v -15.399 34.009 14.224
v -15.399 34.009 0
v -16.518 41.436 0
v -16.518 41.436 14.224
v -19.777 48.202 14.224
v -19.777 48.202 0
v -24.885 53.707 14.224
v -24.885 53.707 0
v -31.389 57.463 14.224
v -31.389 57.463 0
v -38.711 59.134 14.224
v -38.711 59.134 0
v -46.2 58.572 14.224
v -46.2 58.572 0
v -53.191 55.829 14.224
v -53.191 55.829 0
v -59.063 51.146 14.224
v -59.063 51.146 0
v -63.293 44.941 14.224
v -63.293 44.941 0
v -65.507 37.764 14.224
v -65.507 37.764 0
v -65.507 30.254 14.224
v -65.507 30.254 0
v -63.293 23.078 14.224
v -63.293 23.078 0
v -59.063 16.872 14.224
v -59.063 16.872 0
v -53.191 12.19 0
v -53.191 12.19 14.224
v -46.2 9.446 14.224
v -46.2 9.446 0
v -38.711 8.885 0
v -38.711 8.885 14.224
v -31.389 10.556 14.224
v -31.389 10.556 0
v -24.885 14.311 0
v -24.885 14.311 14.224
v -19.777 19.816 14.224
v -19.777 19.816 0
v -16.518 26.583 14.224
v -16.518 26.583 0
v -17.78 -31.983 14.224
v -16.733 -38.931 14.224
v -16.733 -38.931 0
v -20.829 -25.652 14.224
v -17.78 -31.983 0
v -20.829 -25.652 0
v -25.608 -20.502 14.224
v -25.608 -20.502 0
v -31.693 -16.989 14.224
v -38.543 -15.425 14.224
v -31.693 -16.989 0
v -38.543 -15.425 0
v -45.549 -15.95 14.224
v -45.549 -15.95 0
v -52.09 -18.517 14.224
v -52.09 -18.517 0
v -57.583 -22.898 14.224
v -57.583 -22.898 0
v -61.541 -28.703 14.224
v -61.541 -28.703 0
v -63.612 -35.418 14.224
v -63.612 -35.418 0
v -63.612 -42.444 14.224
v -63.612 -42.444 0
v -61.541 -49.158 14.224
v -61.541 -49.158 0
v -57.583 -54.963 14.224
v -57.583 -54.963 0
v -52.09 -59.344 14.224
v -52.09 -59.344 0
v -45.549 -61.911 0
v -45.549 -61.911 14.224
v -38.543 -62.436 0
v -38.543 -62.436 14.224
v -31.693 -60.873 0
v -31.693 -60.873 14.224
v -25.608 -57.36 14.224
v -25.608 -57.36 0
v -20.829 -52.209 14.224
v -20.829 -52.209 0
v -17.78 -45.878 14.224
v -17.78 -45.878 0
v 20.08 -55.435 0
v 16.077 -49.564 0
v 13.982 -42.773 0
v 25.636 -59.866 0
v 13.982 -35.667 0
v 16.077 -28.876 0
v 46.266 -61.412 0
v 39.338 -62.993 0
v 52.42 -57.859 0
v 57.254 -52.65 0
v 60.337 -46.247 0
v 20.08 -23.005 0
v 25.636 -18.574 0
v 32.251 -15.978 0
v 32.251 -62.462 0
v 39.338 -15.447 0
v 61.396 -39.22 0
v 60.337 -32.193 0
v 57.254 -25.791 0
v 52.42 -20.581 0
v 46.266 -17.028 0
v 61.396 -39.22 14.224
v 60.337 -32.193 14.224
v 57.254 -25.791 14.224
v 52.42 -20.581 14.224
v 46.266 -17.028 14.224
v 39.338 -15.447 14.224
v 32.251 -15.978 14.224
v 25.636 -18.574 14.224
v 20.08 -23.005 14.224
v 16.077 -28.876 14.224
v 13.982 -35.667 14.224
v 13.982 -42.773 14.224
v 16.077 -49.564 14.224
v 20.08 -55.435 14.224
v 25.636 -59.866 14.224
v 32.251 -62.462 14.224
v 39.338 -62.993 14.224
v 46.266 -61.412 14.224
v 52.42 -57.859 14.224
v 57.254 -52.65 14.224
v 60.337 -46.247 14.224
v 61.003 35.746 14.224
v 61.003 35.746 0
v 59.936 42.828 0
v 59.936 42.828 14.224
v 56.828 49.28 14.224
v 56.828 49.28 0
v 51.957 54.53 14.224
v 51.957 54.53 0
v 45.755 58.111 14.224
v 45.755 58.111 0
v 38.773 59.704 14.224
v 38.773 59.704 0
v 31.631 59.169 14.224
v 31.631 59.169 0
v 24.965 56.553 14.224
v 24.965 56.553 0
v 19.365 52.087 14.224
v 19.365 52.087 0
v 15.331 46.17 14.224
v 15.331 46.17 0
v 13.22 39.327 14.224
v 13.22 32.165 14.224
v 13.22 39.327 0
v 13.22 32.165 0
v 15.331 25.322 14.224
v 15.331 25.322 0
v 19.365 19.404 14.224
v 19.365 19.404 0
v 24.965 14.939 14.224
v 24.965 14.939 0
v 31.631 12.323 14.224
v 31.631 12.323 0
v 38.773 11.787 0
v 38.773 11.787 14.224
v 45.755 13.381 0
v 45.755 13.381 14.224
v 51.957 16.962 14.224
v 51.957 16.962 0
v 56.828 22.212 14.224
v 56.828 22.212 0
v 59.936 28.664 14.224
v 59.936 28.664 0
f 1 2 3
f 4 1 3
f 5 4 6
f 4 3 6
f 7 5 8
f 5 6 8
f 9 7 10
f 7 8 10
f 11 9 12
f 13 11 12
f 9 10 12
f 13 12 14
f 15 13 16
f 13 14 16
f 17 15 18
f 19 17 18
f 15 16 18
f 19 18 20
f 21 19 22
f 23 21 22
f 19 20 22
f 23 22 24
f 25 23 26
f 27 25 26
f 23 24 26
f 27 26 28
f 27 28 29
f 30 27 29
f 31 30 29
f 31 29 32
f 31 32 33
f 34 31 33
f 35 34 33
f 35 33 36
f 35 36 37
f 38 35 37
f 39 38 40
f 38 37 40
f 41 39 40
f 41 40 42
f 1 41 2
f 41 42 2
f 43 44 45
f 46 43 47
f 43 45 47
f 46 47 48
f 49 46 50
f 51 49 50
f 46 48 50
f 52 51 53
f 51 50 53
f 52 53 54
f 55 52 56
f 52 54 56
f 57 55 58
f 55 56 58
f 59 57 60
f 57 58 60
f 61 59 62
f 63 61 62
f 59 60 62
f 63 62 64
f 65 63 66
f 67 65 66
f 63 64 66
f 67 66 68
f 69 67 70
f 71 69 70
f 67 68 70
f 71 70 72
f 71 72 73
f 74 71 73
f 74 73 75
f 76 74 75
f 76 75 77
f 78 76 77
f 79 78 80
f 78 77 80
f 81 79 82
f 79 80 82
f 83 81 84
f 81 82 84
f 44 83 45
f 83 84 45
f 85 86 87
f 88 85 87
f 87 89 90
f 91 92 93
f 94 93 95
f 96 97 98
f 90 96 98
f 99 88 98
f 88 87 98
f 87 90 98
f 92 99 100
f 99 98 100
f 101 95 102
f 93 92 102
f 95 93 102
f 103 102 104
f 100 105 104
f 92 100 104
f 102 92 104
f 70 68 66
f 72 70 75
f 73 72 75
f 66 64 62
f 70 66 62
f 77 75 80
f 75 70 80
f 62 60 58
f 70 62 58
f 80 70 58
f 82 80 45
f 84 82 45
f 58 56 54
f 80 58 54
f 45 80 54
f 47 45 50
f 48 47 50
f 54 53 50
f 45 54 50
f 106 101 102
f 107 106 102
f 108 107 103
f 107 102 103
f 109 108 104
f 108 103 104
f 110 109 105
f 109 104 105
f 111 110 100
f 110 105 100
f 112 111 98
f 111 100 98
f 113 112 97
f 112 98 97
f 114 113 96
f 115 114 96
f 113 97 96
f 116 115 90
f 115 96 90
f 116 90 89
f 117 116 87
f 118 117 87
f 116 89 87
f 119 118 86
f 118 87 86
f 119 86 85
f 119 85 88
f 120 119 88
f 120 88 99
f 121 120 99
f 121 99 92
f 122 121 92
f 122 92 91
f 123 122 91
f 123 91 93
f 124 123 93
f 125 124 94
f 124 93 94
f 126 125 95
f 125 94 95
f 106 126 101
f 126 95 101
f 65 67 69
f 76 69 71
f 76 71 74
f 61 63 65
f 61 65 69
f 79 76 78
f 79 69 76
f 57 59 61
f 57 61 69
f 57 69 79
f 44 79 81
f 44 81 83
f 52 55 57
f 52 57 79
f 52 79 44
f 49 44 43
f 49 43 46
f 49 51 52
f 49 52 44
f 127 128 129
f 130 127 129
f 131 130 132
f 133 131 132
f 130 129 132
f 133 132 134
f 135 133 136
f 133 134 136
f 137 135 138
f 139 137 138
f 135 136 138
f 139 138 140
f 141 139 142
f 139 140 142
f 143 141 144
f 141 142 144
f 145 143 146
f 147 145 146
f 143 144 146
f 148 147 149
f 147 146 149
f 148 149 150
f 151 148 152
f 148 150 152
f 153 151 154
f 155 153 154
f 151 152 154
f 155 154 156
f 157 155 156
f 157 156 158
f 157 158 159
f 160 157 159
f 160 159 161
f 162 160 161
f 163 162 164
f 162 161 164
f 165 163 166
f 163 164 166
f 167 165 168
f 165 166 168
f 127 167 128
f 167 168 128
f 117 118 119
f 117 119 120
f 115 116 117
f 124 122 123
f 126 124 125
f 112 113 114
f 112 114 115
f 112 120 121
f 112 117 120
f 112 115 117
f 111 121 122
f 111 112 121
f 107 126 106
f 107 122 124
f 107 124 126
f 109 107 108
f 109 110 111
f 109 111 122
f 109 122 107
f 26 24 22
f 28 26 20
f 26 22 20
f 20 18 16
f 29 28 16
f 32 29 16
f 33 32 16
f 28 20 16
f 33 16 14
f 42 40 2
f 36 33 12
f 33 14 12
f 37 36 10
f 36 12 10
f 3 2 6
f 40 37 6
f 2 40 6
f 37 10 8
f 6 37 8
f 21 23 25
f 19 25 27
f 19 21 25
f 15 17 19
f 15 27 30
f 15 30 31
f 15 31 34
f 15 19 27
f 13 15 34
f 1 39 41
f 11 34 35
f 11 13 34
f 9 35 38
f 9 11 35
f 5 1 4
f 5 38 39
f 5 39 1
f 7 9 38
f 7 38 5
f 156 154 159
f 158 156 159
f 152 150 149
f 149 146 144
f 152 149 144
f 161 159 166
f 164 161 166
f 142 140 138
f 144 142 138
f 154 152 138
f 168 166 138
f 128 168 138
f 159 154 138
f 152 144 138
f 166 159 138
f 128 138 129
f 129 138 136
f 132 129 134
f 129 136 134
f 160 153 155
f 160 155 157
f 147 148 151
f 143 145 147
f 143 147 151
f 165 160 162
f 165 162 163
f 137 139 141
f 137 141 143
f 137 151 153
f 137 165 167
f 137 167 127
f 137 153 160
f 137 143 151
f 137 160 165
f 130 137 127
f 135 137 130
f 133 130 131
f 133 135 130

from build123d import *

# Parameters (mm, degrees)
F0_R     = 25.194924
F0_R_2   = 24.025589
F0_R_3   = 23.571473
F0_R_4   = 23.840062
F1_DEPTH = 14.224


with BuildPart() as f1:
    # F0 (on Top) → F1 (new body)
    with BuildSketch(Plane.XY):
        with Locations((-40.593624, 34.009214)):
            Circle(F0_R)
        with Locations((36.977343, 35.745878)):
            Circle(F0_R_2)
        with Locations((-40.30418, -38.930651)):
            Circle(F0_R_3)
        with Locations((37.556231, -39.220095)):
            Circle(F0_R_4)
    extrude(amount=F1_DEPTH)


solid = f1.part
